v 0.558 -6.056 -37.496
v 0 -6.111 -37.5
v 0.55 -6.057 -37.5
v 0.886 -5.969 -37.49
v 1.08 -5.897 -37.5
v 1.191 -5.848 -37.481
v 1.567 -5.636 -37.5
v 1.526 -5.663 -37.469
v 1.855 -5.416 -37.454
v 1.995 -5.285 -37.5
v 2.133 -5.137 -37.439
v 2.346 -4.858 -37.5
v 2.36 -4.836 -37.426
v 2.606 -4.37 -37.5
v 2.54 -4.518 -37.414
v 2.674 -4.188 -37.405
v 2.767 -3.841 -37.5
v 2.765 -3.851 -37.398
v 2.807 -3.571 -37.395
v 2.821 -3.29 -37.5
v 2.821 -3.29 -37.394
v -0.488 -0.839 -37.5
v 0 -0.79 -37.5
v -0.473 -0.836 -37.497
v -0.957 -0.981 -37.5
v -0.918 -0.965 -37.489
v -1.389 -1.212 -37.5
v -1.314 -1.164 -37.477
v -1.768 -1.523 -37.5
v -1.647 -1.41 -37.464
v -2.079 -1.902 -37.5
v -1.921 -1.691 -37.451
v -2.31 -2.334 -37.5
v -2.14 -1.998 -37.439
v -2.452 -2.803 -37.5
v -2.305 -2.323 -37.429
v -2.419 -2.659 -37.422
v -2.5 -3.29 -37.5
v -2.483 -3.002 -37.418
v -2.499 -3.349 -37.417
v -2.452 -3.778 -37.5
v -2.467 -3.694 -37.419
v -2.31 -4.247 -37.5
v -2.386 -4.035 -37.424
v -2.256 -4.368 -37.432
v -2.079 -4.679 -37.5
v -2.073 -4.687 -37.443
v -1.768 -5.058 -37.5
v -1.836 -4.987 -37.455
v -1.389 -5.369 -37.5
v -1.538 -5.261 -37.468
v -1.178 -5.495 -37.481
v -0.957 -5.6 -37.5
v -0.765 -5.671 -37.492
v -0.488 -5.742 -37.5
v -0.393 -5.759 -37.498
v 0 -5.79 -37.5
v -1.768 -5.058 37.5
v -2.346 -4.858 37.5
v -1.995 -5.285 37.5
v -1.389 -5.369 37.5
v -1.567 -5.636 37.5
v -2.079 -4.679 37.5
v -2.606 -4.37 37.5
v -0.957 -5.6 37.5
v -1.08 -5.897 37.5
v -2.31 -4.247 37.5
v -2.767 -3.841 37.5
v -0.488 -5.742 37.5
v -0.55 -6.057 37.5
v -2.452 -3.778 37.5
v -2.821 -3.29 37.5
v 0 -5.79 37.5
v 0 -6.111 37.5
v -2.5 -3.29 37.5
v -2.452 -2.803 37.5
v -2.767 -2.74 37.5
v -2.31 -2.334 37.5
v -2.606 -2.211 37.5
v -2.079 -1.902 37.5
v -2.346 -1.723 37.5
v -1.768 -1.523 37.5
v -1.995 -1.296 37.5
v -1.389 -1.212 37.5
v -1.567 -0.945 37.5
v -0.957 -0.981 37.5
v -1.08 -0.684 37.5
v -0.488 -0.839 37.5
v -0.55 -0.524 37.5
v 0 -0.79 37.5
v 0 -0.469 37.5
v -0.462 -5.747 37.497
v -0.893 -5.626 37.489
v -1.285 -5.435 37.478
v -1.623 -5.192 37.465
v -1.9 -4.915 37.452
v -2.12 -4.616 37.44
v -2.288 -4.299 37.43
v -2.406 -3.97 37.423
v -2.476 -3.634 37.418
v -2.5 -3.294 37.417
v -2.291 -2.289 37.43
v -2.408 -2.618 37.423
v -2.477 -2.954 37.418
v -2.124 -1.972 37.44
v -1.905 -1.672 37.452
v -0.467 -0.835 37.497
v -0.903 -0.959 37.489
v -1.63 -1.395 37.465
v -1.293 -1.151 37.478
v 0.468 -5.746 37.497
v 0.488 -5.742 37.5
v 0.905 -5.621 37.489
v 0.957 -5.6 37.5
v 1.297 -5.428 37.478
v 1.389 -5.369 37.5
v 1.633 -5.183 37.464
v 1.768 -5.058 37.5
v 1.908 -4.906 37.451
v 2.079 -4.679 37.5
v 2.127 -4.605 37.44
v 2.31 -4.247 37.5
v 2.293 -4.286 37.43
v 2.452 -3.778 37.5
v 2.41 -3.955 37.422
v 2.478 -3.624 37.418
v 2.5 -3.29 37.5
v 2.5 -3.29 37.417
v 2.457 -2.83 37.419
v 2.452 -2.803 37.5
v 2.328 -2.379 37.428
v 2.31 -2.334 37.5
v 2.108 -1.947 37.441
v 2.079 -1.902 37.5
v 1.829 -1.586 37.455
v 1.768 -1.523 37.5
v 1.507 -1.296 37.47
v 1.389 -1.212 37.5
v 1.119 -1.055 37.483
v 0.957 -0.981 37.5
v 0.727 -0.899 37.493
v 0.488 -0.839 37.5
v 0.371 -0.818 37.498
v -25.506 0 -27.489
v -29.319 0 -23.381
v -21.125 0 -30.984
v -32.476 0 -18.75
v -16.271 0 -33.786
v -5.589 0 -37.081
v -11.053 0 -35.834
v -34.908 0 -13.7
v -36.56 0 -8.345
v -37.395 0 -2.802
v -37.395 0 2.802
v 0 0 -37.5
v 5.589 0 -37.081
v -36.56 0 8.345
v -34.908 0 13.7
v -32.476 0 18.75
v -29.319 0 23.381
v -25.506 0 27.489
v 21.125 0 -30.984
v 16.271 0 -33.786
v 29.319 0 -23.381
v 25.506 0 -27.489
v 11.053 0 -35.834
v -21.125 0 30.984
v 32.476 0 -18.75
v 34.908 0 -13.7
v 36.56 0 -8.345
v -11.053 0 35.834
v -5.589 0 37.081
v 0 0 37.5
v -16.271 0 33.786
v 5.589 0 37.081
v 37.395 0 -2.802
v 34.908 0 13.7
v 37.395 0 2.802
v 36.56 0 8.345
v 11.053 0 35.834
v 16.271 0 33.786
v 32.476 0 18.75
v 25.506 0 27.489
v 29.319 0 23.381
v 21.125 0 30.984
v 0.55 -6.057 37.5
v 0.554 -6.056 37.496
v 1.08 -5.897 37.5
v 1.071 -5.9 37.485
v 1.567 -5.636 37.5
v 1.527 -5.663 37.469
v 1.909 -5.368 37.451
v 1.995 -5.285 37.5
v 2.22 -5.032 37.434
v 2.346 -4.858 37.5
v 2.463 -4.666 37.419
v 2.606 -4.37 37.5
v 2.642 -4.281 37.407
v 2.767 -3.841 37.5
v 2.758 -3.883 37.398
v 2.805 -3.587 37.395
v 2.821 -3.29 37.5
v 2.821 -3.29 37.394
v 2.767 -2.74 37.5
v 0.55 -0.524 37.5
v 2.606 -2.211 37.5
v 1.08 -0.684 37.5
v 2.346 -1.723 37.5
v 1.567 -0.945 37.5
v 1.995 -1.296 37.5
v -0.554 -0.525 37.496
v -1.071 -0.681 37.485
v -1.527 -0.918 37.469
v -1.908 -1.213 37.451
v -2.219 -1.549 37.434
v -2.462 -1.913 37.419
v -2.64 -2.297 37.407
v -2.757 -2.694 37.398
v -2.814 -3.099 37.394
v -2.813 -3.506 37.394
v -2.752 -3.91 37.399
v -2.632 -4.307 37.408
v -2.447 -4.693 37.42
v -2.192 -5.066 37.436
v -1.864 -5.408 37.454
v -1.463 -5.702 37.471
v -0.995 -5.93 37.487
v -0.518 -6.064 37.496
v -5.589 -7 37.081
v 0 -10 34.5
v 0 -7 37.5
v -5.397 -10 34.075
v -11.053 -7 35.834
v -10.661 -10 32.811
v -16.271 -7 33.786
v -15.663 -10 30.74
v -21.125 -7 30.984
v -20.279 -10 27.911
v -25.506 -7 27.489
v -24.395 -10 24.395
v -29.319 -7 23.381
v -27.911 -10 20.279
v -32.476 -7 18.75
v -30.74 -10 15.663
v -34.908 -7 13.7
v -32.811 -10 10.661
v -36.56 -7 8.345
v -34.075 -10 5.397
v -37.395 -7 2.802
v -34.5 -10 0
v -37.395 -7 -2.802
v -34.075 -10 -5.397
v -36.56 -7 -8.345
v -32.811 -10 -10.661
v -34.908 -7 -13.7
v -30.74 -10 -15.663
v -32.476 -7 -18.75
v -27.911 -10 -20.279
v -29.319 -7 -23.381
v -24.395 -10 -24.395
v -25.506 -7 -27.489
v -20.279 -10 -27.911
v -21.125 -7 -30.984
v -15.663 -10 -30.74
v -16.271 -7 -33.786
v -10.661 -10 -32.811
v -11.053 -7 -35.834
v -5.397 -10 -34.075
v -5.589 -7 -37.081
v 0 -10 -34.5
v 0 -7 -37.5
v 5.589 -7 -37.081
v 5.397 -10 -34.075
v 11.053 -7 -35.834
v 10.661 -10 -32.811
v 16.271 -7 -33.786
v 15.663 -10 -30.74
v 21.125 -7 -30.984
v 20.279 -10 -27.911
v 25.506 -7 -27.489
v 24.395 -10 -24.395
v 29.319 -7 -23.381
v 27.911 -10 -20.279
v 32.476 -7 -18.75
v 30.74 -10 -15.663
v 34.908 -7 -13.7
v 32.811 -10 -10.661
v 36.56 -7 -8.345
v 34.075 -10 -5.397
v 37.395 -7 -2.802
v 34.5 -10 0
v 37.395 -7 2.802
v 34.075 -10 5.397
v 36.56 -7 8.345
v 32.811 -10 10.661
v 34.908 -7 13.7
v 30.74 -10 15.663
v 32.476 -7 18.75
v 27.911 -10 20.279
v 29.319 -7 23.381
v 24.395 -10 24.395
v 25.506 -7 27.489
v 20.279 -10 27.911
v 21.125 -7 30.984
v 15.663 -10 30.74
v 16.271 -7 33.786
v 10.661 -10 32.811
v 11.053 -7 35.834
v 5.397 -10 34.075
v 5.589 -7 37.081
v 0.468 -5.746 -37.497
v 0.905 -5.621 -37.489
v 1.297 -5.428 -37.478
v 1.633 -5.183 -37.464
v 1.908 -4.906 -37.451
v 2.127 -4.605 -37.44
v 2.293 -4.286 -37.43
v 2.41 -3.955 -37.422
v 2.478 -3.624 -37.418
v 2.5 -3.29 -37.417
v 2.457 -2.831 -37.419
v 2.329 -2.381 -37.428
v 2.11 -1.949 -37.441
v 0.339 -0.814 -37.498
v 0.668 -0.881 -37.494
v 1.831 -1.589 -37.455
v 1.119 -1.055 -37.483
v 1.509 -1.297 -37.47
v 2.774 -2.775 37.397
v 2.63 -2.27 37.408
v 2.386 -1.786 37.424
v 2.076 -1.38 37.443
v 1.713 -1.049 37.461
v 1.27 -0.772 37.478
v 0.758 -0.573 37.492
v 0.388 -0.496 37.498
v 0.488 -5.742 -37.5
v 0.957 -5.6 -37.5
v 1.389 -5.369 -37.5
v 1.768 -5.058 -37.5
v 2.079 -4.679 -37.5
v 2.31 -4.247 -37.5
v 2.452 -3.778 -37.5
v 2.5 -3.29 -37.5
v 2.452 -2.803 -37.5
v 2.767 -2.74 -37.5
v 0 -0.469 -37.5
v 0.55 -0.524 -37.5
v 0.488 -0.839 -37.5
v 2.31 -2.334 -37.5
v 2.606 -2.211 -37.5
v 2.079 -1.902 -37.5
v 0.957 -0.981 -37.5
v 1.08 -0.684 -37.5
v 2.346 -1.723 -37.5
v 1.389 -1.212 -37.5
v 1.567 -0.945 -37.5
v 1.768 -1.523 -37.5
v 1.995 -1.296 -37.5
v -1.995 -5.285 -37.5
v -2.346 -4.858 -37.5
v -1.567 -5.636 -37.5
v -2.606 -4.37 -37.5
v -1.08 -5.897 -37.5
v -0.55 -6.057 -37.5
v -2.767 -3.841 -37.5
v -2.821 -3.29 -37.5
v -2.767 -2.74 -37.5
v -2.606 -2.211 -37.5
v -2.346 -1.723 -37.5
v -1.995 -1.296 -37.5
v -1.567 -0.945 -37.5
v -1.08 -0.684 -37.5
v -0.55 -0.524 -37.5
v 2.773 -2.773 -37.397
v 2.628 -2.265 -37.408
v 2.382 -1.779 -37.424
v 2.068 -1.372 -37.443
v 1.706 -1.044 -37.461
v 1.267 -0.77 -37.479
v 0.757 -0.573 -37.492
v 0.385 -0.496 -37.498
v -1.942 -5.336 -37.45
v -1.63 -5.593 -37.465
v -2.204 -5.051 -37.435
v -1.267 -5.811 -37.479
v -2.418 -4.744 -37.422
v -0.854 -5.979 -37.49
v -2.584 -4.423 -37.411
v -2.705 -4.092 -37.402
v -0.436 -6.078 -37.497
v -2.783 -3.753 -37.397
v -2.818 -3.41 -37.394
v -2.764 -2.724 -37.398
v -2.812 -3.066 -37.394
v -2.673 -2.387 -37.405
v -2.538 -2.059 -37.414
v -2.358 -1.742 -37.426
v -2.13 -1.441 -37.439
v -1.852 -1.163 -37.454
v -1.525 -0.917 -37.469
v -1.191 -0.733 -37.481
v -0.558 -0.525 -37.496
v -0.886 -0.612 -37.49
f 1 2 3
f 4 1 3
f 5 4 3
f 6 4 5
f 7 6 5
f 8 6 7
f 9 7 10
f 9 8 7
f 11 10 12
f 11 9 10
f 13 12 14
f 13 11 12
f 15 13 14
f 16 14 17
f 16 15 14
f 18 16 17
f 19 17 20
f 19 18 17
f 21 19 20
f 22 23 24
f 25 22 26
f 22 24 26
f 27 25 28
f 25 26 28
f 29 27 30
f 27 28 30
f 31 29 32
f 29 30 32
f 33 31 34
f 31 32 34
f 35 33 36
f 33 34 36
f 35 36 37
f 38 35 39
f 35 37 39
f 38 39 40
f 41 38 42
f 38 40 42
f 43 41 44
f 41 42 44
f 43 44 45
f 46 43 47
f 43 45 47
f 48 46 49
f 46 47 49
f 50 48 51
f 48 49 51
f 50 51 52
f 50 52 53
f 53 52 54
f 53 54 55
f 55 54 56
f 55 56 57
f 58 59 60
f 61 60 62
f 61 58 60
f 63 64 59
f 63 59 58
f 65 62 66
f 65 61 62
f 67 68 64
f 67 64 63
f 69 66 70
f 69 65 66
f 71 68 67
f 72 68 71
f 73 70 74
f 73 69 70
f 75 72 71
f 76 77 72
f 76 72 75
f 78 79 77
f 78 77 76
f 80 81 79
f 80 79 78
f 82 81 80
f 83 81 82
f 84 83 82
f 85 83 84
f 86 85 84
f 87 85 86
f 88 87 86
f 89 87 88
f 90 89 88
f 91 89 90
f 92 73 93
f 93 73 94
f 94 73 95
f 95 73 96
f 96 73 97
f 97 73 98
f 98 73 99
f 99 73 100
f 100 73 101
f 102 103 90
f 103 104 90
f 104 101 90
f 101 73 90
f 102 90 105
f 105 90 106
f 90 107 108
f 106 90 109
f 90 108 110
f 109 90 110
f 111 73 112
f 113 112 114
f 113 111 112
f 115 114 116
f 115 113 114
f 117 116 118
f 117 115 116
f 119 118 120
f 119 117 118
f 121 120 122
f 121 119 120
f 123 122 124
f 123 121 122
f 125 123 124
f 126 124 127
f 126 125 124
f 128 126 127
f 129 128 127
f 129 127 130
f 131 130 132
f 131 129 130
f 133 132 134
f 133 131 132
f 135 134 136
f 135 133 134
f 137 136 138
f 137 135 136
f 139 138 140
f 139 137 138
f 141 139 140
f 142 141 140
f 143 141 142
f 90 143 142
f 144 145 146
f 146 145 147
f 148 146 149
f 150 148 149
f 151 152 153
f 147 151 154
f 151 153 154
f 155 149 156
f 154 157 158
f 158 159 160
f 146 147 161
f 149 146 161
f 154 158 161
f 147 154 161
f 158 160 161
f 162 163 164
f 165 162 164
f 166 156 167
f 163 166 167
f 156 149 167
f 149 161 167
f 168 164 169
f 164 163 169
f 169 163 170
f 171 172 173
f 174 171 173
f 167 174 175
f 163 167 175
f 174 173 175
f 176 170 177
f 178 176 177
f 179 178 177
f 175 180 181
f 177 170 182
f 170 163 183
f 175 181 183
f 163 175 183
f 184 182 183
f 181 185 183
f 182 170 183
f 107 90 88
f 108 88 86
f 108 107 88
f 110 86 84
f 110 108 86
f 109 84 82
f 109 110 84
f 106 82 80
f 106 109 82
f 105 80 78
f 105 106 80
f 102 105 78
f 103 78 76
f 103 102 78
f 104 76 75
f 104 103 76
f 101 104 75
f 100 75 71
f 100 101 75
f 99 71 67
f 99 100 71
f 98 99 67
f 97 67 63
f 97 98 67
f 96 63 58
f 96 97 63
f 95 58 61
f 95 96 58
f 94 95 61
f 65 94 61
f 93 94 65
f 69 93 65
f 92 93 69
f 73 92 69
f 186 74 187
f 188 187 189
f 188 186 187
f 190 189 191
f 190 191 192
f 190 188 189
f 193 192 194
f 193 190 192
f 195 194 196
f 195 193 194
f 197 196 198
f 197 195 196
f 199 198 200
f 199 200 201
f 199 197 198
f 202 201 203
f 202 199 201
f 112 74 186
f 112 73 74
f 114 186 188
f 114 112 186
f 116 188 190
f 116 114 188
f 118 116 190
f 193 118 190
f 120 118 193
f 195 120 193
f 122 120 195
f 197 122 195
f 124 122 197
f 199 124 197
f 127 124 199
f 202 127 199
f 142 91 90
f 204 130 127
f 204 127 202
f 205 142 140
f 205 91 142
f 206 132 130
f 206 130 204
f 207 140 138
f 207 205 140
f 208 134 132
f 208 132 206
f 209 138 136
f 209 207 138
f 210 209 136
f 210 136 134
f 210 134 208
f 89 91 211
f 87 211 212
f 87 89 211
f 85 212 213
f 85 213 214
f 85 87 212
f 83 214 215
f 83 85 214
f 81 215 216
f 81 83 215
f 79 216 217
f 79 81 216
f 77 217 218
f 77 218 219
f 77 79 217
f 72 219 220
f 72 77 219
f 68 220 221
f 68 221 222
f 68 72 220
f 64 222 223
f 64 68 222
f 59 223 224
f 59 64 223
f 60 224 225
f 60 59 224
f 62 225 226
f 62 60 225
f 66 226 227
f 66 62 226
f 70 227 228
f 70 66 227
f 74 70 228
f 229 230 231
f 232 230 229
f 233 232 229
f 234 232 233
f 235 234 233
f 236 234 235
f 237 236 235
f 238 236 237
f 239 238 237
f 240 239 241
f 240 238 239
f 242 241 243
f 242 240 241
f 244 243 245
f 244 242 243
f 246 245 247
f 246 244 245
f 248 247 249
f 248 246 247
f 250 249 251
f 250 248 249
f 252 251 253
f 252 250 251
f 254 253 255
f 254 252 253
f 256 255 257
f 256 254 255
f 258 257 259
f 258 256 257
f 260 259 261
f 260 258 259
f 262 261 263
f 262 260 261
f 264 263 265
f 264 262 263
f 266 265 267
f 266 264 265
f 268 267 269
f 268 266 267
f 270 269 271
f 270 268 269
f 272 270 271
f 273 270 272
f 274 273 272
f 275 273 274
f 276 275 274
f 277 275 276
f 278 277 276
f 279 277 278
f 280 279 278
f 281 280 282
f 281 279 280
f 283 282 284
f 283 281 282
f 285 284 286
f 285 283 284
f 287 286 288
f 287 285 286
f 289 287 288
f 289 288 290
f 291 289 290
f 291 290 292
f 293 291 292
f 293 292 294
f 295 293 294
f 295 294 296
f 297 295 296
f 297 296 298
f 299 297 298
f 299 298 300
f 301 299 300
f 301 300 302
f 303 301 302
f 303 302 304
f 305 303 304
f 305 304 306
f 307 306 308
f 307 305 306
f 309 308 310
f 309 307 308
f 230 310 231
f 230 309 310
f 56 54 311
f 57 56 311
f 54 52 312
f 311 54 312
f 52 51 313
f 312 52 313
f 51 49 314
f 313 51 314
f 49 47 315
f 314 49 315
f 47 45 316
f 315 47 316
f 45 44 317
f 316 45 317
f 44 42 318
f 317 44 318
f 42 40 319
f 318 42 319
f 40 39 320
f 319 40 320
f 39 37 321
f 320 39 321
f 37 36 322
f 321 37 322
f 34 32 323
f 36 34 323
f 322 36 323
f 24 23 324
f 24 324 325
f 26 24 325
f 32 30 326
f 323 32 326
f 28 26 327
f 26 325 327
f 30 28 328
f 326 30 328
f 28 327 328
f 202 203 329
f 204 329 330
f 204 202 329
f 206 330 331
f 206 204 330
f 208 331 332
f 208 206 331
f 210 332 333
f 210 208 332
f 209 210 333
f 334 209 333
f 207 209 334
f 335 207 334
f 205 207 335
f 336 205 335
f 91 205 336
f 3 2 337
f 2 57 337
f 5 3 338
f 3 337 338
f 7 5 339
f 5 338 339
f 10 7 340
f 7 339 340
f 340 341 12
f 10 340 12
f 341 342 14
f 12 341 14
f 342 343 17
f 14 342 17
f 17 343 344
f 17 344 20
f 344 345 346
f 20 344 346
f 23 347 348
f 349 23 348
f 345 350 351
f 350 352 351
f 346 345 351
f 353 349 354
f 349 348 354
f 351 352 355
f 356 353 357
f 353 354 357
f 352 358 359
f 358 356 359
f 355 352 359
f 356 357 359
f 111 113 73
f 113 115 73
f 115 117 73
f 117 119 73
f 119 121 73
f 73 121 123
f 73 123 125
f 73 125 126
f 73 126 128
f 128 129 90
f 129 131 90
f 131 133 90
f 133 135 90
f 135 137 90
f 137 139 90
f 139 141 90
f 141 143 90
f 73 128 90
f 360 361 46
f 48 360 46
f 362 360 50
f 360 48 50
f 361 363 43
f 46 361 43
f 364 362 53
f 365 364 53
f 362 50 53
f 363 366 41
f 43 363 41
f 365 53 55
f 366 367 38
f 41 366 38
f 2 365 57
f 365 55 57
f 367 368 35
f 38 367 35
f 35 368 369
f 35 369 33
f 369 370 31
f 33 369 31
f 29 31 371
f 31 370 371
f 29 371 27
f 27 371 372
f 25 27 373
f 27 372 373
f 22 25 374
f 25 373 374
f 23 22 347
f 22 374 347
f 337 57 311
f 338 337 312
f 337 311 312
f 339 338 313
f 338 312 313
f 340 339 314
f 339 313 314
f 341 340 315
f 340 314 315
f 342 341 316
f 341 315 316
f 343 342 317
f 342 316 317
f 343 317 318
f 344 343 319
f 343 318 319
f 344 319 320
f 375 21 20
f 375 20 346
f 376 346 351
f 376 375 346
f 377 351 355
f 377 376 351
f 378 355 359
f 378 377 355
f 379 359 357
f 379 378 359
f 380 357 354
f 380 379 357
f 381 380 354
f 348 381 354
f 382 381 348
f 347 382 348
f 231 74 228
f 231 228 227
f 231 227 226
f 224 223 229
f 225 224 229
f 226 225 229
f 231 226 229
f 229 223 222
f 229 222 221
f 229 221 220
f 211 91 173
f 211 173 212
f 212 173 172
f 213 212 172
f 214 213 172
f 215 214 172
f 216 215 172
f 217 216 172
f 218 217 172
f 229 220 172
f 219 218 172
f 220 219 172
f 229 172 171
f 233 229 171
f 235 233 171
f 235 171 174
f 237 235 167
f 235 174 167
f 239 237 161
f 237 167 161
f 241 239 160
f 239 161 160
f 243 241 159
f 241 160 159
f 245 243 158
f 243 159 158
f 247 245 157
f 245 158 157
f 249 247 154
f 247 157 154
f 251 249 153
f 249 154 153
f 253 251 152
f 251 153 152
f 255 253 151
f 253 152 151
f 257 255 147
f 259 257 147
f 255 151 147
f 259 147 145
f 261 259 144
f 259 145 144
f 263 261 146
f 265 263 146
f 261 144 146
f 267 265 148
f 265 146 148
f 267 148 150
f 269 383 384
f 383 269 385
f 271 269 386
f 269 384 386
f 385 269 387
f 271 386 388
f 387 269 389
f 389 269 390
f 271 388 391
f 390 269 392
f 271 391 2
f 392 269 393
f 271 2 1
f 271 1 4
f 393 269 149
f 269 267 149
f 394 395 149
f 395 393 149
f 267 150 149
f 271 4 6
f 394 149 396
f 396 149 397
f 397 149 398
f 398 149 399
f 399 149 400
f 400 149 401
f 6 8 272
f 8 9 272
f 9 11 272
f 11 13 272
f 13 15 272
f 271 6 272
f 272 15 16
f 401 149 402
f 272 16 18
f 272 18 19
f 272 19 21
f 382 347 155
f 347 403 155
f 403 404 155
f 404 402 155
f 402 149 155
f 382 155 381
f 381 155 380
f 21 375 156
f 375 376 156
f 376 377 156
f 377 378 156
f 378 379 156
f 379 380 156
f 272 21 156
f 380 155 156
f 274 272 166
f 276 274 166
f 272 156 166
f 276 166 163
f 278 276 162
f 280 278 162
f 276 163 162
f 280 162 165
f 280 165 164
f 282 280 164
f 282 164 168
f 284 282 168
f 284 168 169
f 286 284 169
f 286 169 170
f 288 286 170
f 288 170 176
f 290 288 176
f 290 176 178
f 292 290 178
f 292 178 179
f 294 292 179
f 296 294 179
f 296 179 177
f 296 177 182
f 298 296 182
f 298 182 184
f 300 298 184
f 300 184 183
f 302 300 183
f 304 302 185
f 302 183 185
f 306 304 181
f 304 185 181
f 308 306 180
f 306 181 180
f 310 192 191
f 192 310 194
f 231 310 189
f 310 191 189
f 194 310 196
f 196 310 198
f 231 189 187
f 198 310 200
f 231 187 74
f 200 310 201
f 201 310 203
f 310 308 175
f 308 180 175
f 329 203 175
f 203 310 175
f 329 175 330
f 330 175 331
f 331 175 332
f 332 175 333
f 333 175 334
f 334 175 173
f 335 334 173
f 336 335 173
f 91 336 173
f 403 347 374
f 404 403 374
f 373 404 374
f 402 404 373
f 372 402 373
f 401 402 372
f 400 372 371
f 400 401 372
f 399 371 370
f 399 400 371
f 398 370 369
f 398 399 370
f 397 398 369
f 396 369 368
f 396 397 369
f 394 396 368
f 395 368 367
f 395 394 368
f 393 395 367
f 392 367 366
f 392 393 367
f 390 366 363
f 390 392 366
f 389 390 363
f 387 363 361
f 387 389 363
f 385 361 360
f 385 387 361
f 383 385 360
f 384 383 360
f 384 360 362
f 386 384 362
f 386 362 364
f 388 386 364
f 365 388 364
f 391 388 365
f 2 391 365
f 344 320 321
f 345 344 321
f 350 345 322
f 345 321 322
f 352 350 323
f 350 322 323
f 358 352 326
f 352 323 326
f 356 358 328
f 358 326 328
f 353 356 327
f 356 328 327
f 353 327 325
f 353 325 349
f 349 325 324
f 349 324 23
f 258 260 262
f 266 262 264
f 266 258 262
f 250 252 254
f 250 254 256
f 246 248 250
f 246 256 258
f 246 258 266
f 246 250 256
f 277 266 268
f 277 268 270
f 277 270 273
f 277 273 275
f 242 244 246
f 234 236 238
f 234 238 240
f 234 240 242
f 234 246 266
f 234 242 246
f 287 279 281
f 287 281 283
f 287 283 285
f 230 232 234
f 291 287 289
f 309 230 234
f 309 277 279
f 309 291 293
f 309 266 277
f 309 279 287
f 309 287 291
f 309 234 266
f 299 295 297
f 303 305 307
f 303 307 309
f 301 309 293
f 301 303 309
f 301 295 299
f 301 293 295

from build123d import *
from build123d import SkipClean  # not in build123d's __all__

# Parameters (mm, degrees)
F1_DEPTH = 10
F2_SIZE  = 3
F3_R     = 2.821
F3_R_2   = 2.5
F4_DEPTH = 37.5
F5_DEPTH = 75


with BuildPart() as f1:
    # F0 (on Front) → F1 (new body)
    with BuildSketch(Plane.XZ):
        with BuildLine():
            ThreePointArc((37.5, 0), (26.5165042945, 26.5165042945), (0, 37.5))
            Line((0, 37.5), (0, -37.5))
            ThreePointArc((0, -37.5), (26.5165042945, -26.5165042945), (37.5, 0))
        make_face()
        with BuildLine():
            Line((0, -37.5), (0, 37.5))
            ThreePointArc((0, 37.5), (-37.5, 0), (0, -37.5))
        make_face()
    extrude(amount=F1_DEPTH)

    # F2
    f2_edges = [f1.edges().sort_by_distance(p)[0] for p in [
        (-37.5, -10, 0),
    ]]
    chamfer(f2_edges, length=F2_SIZE)

    # F3 (on Top) → F4 (join, symmetric)
    with BuildSketch(Plane.XY):
        with Locations((0, -3.2904869877)):
            Circle(F3_R)
        with Locations((0, -3.2904869877)):
            Circle(F3_R_2, mode=Mode.SUBTRACT)
    with SkipClean():  # cleaning this boolean's faces spoils the solid; the shape is the same uncleaned
        extrude(amount=F4_DEPTH, both=True)

    # F5 (add): a face of the model
    f5_faces = [f1.faces().sort_by_distance(p)[0] for p in [
        (-0.0630794776, -0.6299869877, -37.5),
    ]]
    with SkipClean():  # cleaning this boolean's faces spoils the solid; the shape is the same uncleaned
        extrude(f5_faces, amount=-F5_DEPTH)


solid = f1.part
